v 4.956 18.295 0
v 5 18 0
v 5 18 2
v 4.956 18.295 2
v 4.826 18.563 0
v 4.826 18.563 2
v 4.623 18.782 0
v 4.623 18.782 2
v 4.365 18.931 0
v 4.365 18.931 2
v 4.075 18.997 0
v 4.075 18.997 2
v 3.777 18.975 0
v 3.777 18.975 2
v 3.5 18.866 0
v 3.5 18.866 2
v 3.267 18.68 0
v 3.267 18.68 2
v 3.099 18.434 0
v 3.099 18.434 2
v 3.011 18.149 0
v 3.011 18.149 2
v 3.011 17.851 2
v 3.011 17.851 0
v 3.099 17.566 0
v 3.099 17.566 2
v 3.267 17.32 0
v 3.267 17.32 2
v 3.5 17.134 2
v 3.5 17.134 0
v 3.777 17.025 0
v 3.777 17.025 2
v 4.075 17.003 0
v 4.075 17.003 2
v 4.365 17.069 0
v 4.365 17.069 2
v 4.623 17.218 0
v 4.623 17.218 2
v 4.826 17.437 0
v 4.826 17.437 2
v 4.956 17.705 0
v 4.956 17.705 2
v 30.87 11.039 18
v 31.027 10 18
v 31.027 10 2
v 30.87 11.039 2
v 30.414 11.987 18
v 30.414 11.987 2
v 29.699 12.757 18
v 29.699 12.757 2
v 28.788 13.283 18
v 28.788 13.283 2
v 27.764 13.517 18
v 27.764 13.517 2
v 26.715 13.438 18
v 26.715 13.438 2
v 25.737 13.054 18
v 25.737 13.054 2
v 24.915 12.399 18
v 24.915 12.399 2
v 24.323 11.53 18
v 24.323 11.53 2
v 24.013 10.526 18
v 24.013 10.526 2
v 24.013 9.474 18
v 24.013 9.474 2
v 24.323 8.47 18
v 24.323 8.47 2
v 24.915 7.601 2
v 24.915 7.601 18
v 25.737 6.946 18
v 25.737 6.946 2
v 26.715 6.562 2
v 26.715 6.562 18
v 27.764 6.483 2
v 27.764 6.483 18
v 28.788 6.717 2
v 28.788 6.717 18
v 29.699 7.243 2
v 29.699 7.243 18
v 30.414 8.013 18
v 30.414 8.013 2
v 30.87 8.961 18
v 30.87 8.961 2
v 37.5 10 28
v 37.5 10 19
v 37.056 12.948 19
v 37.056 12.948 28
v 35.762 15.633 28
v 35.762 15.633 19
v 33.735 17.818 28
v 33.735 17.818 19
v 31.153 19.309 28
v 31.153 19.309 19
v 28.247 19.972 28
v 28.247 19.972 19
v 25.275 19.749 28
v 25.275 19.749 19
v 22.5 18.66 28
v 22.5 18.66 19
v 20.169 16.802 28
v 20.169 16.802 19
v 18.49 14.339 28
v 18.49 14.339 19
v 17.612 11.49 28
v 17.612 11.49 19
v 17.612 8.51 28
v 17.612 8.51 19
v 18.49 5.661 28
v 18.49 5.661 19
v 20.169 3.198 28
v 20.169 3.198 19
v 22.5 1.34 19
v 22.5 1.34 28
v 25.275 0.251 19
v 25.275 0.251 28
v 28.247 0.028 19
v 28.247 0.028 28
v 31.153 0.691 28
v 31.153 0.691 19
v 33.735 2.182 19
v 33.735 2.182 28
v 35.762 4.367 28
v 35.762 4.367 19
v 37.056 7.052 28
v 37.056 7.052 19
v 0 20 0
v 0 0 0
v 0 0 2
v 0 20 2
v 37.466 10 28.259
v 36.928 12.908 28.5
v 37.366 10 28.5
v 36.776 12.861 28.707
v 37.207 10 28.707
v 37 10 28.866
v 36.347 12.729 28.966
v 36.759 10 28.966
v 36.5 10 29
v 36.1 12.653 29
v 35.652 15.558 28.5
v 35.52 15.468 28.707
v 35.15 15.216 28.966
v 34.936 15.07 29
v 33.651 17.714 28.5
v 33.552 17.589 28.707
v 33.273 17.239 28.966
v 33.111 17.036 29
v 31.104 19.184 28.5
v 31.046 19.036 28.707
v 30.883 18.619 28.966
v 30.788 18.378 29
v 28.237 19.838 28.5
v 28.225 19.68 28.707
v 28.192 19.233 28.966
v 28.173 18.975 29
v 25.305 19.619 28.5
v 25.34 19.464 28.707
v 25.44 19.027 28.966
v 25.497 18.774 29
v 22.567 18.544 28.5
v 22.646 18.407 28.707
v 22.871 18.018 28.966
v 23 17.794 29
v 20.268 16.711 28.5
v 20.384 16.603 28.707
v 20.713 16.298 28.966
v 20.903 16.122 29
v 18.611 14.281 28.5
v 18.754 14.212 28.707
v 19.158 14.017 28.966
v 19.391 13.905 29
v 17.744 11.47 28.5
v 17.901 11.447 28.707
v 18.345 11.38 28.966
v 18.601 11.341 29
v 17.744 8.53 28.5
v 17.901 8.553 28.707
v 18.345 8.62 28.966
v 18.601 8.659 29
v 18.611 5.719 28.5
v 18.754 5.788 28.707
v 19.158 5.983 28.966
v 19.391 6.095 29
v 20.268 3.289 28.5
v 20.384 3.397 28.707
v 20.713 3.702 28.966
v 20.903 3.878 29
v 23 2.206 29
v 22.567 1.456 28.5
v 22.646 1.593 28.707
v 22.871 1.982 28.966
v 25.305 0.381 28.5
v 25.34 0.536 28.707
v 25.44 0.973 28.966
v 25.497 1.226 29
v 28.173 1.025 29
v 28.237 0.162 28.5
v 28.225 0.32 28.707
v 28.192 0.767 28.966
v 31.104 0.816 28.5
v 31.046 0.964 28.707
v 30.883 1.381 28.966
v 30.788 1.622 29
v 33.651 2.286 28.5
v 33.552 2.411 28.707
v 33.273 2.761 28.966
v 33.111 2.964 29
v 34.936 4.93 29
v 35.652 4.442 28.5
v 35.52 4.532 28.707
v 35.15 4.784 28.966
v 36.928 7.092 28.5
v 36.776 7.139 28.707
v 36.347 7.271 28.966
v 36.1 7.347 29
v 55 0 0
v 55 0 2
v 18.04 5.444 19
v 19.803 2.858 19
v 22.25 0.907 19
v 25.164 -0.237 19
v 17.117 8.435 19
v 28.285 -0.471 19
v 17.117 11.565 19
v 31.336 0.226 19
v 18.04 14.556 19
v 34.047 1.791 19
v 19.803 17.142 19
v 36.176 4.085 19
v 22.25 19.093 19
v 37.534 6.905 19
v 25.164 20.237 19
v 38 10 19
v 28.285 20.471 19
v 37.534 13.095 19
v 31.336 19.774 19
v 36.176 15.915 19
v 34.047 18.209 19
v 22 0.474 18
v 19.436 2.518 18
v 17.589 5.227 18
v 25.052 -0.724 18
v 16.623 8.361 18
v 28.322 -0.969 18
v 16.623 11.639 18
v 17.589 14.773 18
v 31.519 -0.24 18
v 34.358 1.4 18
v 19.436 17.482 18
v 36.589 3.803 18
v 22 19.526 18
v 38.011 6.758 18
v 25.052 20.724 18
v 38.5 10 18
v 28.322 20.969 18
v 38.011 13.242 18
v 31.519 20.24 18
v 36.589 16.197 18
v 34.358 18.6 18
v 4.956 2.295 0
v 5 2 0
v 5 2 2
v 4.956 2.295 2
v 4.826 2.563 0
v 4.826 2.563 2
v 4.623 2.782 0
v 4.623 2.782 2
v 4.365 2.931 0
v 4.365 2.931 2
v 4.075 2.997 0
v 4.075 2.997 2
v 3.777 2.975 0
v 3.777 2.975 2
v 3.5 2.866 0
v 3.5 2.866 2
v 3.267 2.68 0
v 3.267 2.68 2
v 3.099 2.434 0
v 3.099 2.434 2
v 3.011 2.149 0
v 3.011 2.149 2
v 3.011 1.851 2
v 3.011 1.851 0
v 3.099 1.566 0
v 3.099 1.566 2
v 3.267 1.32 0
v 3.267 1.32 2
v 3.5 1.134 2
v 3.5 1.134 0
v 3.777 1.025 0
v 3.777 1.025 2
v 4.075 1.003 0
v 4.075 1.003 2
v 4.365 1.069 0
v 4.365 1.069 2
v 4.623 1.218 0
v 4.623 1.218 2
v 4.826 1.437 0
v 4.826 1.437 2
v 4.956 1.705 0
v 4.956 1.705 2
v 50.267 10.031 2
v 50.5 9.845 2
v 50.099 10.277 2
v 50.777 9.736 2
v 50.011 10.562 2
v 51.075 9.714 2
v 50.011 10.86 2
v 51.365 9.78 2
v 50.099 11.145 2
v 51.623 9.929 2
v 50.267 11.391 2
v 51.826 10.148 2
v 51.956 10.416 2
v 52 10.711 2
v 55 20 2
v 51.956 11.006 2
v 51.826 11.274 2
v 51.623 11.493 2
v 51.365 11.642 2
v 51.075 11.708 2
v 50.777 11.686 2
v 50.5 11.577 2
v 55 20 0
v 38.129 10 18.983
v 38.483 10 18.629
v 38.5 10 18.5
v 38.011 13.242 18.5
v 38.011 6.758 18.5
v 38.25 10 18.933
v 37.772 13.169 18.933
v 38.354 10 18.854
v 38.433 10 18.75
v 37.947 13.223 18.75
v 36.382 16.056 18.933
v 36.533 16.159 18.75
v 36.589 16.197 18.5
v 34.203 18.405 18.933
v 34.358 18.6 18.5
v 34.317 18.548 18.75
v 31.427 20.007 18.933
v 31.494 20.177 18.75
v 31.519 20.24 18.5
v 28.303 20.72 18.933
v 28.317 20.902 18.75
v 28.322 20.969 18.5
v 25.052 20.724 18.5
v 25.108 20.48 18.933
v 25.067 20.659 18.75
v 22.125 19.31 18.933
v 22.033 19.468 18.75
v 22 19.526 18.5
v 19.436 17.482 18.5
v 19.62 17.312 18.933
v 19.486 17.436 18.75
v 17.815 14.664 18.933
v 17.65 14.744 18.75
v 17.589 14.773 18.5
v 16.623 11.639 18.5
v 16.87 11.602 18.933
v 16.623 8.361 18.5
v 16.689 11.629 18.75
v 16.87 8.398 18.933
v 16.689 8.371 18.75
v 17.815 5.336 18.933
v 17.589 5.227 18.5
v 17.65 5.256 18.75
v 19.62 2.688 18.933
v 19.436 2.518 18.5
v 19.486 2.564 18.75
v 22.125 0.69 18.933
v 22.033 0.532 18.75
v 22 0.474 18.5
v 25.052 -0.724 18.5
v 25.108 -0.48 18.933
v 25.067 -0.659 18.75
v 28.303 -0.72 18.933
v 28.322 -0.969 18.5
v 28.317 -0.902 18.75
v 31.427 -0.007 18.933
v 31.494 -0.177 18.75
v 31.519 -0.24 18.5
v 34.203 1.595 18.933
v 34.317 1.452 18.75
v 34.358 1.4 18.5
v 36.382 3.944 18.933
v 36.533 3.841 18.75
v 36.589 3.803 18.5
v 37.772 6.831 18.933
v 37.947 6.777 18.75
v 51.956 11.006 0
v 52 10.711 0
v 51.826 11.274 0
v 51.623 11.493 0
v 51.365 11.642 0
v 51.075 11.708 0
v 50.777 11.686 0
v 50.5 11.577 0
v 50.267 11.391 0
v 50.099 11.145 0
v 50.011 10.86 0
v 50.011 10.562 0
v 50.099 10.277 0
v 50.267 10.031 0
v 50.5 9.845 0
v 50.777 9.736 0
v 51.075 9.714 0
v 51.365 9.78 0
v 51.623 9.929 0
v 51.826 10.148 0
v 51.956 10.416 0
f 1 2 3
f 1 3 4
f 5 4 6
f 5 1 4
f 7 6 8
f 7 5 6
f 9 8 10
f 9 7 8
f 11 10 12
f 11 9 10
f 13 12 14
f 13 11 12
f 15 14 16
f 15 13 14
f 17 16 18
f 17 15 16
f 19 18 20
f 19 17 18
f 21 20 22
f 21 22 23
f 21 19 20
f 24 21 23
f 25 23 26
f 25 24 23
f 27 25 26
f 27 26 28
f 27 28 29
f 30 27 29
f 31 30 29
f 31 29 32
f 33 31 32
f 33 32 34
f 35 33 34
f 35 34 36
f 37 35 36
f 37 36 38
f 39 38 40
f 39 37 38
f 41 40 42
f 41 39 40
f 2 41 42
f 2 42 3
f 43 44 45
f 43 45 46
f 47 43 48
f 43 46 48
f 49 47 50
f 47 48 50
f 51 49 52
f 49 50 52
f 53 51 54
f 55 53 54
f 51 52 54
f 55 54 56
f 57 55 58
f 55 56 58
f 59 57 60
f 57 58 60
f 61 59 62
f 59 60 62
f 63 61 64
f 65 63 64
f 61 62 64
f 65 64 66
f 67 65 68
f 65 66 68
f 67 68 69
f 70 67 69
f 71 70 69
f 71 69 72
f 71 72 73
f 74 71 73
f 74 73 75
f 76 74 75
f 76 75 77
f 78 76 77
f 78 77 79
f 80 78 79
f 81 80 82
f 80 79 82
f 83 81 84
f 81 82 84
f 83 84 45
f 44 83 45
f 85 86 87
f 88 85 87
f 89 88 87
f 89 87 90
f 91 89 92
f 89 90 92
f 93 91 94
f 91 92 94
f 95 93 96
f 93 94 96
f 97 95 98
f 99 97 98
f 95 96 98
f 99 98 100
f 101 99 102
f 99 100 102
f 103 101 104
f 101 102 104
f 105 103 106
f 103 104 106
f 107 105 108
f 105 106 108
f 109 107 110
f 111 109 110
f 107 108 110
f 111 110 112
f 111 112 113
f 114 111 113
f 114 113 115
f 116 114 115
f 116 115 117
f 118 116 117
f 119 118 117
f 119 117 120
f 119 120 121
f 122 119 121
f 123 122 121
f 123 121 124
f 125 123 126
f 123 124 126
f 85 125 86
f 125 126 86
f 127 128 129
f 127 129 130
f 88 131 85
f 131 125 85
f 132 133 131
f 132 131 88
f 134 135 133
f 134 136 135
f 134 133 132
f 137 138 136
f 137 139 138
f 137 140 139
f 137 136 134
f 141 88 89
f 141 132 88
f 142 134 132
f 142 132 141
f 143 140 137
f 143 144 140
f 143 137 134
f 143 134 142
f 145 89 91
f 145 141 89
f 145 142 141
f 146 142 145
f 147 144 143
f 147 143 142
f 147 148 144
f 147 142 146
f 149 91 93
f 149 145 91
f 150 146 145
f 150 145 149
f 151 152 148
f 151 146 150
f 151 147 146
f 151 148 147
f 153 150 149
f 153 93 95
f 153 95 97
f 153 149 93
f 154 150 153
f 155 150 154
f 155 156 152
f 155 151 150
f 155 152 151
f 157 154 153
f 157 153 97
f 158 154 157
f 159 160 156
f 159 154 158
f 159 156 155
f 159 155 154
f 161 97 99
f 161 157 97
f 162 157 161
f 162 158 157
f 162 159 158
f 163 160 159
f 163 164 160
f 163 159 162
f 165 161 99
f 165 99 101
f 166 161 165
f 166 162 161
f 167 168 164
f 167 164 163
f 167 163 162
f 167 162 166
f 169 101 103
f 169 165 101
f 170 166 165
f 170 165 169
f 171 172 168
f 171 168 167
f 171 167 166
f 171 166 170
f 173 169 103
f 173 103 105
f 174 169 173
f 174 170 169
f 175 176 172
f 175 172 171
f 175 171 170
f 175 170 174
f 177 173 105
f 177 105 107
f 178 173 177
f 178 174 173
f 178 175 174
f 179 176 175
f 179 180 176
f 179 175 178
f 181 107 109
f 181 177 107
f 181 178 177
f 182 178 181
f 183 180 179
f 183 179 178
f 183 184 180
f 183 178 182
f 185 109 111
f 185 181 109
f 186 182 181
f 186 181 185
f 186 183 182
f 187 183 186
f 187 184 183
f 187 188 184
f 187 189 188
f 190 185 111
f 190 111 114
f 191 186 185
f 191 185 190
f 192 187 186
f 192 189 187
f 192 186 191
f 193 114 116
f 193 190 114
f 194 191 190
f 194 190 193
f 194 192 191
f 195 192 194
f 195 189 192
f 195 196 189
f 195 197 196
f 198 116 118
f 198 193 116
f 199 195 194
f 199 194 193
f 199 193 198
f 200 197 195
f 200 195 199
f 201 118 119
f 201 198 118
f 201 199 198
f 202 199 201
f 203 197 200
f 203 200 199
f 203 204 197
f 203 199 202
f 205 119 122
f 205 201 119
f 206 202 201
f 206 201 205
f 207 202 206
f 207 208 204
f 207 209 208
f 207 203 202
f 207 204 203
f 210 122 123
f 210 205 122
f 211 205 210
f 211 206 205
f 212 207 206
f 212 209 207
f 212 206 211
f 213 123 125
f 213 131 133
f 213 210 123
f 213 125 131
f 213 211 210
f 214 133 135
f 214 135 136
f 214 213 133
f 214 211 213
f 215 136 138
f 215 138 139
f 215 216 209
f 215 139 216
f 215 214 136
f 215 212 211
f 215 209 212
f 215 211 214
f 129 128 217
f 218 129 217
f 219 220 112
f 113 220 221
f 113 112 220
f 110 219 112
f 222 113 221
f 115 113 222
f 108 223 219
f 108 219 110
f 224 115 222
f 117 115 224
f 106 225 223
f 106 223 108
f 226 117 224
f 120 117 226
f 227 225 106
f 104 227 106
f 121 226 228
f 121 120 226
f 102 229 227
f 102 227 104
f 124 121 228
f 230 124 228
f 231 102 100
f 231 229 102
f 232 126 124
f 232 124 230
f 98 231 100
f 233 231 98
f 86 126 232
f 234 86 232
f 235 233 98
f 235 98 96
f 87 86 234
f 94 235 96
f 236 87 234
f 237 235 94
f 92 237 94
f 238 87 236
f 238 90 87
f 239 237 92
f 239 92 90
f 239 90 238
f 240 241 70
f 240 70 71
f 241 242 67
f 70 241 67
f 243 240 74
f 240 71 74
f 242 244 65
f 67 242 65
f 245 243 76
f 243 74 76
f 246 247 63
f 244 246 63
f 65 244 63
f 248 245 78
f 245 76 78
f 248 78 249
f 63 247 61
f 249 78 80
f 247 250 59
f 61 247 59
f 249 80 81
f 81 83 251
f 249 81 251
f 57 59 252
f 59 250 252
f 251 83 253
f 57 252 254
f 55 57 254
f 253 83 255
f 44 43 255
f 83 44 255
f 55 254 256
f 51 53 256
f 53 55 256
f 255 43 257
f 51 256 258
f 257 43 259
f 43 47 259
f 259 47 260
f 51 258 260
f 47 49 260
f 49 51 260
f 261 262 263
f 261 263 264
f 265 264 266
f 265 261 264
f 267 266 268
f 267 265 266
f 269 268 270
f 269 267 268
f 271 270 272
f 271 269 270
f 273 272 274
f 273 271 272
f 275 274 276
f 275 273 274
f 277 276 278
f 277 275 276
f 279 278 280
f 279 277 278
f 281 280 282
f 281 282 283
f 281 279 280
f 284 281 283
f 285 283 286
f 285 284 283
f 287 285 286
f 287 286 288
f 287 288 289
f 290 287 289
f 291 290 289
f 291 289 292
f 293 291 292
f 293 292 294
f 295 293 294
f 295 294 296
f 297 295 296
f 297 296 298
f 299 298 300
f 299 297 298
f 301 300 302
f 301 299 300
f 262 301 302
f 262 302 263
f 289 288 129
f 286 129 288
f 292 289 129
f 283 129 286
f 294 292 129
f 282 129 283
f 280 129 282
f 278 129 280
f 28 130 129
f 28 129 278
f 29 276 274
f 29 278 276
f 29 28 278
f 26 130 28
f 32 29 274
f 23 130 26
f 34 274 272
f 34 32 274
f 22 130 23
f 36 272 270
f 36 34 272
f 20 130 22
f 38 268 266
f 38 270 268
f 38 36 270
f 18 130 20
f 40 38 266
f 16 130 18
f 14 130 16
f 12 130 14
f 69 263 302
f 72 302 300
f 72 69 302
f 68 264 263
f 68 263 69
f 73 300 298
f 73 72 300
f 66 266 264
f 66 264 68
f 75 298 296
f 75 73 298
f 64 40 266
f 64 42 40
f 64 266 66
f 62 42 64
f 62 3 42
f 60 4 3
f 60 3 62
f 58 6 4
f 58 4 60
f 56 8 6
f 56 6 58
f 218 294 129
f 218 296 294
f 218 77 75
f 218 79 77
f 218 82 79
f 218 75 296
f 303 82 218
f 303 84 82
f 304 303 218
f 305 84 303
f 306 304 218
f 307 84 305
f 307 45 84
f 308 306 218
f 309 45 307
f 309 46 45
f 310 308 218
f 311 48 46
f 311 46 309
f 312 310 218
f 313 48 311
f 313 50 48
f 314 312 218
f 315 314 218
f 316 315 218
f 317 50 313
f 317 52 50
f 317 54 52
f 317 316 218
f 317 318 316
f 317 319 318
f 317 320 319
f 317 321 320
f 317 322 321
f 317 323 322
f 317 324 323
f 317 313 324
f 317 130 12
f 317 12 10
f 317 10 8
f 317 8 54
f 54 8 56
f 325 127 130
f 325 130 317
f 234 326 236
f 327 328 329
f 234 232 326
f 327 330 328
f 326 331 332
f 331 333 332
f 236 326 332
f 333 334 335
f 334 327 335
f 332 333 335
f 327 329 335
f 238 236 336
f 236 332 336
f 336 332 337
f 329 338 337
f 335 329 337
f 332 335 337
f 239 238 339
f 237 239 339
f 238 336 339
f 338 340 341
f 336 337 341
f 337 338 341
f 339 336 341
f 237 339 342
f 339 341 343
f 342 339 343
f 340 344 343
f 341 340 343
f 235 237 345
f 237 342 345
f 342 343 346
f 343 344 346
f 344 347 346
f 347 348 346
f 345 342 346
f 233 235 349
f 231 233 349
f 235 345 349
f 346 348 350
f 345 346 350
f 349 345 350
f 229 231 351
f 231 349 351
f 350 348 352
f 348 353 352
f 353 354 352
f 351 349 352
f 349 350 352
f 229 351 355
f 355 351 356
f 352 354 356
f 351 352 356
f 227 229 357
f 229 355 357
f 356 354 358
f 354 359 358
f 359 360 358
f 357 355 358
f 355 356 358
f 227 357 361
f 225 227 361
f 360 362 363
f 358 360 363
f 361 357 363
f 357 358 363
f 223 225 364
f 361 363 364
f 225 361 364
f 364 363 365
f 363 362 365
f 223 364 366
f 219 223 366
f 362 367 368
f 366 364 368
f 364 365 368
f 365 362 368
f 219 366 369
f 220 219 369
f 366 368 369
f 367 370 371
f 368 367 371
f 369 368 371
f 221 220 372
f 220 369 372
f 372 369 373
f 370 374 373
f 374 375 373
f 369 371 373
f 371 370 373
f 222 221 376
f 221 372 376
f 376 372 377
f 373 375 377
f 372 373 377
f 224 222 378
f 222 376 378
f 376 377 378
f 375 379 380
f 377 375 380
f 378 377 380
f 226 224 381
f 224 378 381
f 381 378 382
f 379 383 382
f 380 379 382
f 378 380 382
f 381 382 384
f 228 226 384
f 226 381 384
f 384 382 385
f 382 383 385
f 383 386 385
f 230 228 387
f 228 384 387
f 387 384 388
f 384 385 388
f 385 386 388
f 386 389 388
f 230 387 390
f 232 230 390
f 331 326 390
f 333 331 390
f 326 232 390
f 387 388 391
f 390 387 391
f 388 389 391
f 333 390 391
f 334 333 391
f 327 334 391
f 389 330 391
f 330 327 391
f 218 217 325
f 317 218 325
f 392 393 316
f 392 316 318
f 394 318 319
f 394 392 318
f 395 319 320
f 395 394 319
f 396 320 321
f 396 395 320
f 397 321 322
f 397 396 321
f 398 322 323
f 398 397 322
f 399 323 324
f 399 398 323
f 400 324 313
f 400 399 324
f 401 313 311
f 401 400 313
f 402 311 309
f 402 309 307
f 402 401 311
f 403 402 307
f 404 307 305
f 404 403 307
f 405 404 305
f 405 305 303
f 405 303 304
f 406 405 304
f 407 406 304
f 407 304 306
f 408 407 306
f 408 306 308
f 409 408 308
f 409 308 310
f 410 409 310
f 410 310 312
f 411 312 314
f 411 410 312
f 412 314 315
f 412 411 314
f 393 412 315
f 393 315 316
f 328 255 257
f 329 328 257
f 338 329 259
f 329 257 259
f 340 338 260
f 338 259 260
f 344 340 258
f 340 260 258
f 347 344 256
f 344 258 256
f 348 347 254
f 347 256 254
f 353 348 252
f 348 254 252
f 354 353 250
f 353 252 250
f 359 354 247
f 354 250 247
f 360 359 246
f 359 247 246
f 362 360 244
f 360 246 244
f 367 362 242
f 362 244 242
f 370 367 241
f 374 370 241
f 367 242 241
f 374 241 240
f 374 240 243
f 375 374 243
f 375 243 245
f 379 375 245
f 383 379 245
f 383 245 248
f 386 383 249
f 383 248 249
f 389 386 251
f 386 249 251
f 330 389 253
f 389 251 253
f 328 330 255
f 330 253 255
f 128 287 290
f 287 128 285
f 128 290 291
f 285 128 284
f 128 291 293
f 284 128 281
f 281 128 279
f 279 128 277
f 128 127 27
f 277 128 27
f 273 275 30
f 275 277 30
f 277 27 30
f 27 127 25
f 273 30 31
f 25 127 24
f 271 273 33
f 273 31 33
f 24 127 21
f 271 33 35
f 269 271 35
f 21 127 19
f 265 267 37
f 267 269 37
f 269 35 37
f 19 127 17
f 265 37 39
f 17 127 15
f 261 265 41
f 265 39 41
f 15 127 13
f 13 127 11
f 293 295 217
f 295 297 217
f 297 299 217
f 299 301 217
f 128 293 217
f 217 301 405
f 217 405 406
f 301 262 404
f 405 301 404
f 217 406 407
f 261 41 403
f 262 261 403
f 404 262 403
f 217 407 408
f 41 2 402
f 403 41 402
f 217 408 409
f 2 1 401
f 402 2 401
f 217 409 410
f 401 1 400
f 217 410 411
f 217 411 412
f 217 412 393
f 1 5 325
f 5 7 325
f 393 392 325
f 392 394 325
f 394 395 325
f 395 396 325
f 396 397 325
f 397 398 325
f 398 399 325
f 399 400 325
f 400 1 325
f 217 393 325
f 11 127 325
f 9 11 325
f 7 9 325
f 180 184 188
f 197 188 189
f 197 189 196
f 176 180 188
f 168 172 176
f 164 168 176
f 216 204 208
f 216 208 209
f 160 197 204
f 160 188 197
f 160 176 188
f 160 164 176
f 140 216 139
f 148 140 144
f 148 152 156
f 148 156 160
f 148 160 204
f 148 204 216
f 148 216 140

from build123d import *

# Parameters (mm, degrees)
SKETCH1_W           = 55
SKETCH1_H           = 20
SKETCH1_R           = 1
BOSS_EXTRUDE1_DEPTH = 2
SKETCH2_R           = 3.526621479
BOSS_EXTRUDE2_DEPTH = 16
SKETCH3_R           = 11
BOSS_EXTRUDE3_DEPTH = 1
SKETCH5_R           = 10
BOSS_EXTRUDE4_DEPTH = 10
FILLET1_R           = 1
FILLET2_R           = 0.5


with BuildPart() as part:
    # Sketch1 → Boss-Extrude1 (new body)
    with BuildSketch(Plane.XY):
        with Locations((27.5, 10)):
            Rectangle(SKETCH1_W, SKETCH1_H)
        with Locations((4, 18)):
            Circle(SKETCH1_R, mode=Mode.SUBTRACT)
        with Locations((4, 2)):
            Circle(SKETCH1_R, mode=Mode.SUBTRACT)
        with Locations((51, 10.710900474)):
            Circle(SKETCH1_R, mode=Mode.SUBTRACT)
    extrude(amount=BOSS_EXTRUDE1_DEPTH)

    # Sketch2 → Boss-Extrude2 (add)
    with BuildSketch(Plane.XY.offset(2)):
        with Locations((27.5, 10)):
            Circle(SKETCH2_R)
    extrude(amount=BOSS_EXTRUDE2_DEPTH)

    # Sketch3 → Boss-Extrude3 (add)
    with BuildSketch(Plane.XY.offset(18)):
        with Locations((27.5, 10)):
            Circle(SKETCH3_R)
    extrude(amount=BOSS_EXTRUDE3_DEPTH)

    # Sketch5 → Boss-Extrude4 (add)
    with BuildSketch(Plane.XY.offset(19)):
        with Locations((27.5, 10)):
            Circle(SKETCH5_R)
    extrude(amount=BOSS_EXTRUDE4_DEPTH)

    # Fillet1
    fillet1_edges = [part.edges().sort_by_distance(p)[0] for p in [
        (17.5, 10, 29),
    ]]
    fillet(fillet1_edges, radius=FILLET1_R)

    # Fillet2
    fillet2_edges = [part.edges().sort_by_distance(p)[0] for p in [
        (16.5, 10, 19),
    ]]
    fillet(fillet2_edges, radius=FILLET2_R)


solid = part.part
